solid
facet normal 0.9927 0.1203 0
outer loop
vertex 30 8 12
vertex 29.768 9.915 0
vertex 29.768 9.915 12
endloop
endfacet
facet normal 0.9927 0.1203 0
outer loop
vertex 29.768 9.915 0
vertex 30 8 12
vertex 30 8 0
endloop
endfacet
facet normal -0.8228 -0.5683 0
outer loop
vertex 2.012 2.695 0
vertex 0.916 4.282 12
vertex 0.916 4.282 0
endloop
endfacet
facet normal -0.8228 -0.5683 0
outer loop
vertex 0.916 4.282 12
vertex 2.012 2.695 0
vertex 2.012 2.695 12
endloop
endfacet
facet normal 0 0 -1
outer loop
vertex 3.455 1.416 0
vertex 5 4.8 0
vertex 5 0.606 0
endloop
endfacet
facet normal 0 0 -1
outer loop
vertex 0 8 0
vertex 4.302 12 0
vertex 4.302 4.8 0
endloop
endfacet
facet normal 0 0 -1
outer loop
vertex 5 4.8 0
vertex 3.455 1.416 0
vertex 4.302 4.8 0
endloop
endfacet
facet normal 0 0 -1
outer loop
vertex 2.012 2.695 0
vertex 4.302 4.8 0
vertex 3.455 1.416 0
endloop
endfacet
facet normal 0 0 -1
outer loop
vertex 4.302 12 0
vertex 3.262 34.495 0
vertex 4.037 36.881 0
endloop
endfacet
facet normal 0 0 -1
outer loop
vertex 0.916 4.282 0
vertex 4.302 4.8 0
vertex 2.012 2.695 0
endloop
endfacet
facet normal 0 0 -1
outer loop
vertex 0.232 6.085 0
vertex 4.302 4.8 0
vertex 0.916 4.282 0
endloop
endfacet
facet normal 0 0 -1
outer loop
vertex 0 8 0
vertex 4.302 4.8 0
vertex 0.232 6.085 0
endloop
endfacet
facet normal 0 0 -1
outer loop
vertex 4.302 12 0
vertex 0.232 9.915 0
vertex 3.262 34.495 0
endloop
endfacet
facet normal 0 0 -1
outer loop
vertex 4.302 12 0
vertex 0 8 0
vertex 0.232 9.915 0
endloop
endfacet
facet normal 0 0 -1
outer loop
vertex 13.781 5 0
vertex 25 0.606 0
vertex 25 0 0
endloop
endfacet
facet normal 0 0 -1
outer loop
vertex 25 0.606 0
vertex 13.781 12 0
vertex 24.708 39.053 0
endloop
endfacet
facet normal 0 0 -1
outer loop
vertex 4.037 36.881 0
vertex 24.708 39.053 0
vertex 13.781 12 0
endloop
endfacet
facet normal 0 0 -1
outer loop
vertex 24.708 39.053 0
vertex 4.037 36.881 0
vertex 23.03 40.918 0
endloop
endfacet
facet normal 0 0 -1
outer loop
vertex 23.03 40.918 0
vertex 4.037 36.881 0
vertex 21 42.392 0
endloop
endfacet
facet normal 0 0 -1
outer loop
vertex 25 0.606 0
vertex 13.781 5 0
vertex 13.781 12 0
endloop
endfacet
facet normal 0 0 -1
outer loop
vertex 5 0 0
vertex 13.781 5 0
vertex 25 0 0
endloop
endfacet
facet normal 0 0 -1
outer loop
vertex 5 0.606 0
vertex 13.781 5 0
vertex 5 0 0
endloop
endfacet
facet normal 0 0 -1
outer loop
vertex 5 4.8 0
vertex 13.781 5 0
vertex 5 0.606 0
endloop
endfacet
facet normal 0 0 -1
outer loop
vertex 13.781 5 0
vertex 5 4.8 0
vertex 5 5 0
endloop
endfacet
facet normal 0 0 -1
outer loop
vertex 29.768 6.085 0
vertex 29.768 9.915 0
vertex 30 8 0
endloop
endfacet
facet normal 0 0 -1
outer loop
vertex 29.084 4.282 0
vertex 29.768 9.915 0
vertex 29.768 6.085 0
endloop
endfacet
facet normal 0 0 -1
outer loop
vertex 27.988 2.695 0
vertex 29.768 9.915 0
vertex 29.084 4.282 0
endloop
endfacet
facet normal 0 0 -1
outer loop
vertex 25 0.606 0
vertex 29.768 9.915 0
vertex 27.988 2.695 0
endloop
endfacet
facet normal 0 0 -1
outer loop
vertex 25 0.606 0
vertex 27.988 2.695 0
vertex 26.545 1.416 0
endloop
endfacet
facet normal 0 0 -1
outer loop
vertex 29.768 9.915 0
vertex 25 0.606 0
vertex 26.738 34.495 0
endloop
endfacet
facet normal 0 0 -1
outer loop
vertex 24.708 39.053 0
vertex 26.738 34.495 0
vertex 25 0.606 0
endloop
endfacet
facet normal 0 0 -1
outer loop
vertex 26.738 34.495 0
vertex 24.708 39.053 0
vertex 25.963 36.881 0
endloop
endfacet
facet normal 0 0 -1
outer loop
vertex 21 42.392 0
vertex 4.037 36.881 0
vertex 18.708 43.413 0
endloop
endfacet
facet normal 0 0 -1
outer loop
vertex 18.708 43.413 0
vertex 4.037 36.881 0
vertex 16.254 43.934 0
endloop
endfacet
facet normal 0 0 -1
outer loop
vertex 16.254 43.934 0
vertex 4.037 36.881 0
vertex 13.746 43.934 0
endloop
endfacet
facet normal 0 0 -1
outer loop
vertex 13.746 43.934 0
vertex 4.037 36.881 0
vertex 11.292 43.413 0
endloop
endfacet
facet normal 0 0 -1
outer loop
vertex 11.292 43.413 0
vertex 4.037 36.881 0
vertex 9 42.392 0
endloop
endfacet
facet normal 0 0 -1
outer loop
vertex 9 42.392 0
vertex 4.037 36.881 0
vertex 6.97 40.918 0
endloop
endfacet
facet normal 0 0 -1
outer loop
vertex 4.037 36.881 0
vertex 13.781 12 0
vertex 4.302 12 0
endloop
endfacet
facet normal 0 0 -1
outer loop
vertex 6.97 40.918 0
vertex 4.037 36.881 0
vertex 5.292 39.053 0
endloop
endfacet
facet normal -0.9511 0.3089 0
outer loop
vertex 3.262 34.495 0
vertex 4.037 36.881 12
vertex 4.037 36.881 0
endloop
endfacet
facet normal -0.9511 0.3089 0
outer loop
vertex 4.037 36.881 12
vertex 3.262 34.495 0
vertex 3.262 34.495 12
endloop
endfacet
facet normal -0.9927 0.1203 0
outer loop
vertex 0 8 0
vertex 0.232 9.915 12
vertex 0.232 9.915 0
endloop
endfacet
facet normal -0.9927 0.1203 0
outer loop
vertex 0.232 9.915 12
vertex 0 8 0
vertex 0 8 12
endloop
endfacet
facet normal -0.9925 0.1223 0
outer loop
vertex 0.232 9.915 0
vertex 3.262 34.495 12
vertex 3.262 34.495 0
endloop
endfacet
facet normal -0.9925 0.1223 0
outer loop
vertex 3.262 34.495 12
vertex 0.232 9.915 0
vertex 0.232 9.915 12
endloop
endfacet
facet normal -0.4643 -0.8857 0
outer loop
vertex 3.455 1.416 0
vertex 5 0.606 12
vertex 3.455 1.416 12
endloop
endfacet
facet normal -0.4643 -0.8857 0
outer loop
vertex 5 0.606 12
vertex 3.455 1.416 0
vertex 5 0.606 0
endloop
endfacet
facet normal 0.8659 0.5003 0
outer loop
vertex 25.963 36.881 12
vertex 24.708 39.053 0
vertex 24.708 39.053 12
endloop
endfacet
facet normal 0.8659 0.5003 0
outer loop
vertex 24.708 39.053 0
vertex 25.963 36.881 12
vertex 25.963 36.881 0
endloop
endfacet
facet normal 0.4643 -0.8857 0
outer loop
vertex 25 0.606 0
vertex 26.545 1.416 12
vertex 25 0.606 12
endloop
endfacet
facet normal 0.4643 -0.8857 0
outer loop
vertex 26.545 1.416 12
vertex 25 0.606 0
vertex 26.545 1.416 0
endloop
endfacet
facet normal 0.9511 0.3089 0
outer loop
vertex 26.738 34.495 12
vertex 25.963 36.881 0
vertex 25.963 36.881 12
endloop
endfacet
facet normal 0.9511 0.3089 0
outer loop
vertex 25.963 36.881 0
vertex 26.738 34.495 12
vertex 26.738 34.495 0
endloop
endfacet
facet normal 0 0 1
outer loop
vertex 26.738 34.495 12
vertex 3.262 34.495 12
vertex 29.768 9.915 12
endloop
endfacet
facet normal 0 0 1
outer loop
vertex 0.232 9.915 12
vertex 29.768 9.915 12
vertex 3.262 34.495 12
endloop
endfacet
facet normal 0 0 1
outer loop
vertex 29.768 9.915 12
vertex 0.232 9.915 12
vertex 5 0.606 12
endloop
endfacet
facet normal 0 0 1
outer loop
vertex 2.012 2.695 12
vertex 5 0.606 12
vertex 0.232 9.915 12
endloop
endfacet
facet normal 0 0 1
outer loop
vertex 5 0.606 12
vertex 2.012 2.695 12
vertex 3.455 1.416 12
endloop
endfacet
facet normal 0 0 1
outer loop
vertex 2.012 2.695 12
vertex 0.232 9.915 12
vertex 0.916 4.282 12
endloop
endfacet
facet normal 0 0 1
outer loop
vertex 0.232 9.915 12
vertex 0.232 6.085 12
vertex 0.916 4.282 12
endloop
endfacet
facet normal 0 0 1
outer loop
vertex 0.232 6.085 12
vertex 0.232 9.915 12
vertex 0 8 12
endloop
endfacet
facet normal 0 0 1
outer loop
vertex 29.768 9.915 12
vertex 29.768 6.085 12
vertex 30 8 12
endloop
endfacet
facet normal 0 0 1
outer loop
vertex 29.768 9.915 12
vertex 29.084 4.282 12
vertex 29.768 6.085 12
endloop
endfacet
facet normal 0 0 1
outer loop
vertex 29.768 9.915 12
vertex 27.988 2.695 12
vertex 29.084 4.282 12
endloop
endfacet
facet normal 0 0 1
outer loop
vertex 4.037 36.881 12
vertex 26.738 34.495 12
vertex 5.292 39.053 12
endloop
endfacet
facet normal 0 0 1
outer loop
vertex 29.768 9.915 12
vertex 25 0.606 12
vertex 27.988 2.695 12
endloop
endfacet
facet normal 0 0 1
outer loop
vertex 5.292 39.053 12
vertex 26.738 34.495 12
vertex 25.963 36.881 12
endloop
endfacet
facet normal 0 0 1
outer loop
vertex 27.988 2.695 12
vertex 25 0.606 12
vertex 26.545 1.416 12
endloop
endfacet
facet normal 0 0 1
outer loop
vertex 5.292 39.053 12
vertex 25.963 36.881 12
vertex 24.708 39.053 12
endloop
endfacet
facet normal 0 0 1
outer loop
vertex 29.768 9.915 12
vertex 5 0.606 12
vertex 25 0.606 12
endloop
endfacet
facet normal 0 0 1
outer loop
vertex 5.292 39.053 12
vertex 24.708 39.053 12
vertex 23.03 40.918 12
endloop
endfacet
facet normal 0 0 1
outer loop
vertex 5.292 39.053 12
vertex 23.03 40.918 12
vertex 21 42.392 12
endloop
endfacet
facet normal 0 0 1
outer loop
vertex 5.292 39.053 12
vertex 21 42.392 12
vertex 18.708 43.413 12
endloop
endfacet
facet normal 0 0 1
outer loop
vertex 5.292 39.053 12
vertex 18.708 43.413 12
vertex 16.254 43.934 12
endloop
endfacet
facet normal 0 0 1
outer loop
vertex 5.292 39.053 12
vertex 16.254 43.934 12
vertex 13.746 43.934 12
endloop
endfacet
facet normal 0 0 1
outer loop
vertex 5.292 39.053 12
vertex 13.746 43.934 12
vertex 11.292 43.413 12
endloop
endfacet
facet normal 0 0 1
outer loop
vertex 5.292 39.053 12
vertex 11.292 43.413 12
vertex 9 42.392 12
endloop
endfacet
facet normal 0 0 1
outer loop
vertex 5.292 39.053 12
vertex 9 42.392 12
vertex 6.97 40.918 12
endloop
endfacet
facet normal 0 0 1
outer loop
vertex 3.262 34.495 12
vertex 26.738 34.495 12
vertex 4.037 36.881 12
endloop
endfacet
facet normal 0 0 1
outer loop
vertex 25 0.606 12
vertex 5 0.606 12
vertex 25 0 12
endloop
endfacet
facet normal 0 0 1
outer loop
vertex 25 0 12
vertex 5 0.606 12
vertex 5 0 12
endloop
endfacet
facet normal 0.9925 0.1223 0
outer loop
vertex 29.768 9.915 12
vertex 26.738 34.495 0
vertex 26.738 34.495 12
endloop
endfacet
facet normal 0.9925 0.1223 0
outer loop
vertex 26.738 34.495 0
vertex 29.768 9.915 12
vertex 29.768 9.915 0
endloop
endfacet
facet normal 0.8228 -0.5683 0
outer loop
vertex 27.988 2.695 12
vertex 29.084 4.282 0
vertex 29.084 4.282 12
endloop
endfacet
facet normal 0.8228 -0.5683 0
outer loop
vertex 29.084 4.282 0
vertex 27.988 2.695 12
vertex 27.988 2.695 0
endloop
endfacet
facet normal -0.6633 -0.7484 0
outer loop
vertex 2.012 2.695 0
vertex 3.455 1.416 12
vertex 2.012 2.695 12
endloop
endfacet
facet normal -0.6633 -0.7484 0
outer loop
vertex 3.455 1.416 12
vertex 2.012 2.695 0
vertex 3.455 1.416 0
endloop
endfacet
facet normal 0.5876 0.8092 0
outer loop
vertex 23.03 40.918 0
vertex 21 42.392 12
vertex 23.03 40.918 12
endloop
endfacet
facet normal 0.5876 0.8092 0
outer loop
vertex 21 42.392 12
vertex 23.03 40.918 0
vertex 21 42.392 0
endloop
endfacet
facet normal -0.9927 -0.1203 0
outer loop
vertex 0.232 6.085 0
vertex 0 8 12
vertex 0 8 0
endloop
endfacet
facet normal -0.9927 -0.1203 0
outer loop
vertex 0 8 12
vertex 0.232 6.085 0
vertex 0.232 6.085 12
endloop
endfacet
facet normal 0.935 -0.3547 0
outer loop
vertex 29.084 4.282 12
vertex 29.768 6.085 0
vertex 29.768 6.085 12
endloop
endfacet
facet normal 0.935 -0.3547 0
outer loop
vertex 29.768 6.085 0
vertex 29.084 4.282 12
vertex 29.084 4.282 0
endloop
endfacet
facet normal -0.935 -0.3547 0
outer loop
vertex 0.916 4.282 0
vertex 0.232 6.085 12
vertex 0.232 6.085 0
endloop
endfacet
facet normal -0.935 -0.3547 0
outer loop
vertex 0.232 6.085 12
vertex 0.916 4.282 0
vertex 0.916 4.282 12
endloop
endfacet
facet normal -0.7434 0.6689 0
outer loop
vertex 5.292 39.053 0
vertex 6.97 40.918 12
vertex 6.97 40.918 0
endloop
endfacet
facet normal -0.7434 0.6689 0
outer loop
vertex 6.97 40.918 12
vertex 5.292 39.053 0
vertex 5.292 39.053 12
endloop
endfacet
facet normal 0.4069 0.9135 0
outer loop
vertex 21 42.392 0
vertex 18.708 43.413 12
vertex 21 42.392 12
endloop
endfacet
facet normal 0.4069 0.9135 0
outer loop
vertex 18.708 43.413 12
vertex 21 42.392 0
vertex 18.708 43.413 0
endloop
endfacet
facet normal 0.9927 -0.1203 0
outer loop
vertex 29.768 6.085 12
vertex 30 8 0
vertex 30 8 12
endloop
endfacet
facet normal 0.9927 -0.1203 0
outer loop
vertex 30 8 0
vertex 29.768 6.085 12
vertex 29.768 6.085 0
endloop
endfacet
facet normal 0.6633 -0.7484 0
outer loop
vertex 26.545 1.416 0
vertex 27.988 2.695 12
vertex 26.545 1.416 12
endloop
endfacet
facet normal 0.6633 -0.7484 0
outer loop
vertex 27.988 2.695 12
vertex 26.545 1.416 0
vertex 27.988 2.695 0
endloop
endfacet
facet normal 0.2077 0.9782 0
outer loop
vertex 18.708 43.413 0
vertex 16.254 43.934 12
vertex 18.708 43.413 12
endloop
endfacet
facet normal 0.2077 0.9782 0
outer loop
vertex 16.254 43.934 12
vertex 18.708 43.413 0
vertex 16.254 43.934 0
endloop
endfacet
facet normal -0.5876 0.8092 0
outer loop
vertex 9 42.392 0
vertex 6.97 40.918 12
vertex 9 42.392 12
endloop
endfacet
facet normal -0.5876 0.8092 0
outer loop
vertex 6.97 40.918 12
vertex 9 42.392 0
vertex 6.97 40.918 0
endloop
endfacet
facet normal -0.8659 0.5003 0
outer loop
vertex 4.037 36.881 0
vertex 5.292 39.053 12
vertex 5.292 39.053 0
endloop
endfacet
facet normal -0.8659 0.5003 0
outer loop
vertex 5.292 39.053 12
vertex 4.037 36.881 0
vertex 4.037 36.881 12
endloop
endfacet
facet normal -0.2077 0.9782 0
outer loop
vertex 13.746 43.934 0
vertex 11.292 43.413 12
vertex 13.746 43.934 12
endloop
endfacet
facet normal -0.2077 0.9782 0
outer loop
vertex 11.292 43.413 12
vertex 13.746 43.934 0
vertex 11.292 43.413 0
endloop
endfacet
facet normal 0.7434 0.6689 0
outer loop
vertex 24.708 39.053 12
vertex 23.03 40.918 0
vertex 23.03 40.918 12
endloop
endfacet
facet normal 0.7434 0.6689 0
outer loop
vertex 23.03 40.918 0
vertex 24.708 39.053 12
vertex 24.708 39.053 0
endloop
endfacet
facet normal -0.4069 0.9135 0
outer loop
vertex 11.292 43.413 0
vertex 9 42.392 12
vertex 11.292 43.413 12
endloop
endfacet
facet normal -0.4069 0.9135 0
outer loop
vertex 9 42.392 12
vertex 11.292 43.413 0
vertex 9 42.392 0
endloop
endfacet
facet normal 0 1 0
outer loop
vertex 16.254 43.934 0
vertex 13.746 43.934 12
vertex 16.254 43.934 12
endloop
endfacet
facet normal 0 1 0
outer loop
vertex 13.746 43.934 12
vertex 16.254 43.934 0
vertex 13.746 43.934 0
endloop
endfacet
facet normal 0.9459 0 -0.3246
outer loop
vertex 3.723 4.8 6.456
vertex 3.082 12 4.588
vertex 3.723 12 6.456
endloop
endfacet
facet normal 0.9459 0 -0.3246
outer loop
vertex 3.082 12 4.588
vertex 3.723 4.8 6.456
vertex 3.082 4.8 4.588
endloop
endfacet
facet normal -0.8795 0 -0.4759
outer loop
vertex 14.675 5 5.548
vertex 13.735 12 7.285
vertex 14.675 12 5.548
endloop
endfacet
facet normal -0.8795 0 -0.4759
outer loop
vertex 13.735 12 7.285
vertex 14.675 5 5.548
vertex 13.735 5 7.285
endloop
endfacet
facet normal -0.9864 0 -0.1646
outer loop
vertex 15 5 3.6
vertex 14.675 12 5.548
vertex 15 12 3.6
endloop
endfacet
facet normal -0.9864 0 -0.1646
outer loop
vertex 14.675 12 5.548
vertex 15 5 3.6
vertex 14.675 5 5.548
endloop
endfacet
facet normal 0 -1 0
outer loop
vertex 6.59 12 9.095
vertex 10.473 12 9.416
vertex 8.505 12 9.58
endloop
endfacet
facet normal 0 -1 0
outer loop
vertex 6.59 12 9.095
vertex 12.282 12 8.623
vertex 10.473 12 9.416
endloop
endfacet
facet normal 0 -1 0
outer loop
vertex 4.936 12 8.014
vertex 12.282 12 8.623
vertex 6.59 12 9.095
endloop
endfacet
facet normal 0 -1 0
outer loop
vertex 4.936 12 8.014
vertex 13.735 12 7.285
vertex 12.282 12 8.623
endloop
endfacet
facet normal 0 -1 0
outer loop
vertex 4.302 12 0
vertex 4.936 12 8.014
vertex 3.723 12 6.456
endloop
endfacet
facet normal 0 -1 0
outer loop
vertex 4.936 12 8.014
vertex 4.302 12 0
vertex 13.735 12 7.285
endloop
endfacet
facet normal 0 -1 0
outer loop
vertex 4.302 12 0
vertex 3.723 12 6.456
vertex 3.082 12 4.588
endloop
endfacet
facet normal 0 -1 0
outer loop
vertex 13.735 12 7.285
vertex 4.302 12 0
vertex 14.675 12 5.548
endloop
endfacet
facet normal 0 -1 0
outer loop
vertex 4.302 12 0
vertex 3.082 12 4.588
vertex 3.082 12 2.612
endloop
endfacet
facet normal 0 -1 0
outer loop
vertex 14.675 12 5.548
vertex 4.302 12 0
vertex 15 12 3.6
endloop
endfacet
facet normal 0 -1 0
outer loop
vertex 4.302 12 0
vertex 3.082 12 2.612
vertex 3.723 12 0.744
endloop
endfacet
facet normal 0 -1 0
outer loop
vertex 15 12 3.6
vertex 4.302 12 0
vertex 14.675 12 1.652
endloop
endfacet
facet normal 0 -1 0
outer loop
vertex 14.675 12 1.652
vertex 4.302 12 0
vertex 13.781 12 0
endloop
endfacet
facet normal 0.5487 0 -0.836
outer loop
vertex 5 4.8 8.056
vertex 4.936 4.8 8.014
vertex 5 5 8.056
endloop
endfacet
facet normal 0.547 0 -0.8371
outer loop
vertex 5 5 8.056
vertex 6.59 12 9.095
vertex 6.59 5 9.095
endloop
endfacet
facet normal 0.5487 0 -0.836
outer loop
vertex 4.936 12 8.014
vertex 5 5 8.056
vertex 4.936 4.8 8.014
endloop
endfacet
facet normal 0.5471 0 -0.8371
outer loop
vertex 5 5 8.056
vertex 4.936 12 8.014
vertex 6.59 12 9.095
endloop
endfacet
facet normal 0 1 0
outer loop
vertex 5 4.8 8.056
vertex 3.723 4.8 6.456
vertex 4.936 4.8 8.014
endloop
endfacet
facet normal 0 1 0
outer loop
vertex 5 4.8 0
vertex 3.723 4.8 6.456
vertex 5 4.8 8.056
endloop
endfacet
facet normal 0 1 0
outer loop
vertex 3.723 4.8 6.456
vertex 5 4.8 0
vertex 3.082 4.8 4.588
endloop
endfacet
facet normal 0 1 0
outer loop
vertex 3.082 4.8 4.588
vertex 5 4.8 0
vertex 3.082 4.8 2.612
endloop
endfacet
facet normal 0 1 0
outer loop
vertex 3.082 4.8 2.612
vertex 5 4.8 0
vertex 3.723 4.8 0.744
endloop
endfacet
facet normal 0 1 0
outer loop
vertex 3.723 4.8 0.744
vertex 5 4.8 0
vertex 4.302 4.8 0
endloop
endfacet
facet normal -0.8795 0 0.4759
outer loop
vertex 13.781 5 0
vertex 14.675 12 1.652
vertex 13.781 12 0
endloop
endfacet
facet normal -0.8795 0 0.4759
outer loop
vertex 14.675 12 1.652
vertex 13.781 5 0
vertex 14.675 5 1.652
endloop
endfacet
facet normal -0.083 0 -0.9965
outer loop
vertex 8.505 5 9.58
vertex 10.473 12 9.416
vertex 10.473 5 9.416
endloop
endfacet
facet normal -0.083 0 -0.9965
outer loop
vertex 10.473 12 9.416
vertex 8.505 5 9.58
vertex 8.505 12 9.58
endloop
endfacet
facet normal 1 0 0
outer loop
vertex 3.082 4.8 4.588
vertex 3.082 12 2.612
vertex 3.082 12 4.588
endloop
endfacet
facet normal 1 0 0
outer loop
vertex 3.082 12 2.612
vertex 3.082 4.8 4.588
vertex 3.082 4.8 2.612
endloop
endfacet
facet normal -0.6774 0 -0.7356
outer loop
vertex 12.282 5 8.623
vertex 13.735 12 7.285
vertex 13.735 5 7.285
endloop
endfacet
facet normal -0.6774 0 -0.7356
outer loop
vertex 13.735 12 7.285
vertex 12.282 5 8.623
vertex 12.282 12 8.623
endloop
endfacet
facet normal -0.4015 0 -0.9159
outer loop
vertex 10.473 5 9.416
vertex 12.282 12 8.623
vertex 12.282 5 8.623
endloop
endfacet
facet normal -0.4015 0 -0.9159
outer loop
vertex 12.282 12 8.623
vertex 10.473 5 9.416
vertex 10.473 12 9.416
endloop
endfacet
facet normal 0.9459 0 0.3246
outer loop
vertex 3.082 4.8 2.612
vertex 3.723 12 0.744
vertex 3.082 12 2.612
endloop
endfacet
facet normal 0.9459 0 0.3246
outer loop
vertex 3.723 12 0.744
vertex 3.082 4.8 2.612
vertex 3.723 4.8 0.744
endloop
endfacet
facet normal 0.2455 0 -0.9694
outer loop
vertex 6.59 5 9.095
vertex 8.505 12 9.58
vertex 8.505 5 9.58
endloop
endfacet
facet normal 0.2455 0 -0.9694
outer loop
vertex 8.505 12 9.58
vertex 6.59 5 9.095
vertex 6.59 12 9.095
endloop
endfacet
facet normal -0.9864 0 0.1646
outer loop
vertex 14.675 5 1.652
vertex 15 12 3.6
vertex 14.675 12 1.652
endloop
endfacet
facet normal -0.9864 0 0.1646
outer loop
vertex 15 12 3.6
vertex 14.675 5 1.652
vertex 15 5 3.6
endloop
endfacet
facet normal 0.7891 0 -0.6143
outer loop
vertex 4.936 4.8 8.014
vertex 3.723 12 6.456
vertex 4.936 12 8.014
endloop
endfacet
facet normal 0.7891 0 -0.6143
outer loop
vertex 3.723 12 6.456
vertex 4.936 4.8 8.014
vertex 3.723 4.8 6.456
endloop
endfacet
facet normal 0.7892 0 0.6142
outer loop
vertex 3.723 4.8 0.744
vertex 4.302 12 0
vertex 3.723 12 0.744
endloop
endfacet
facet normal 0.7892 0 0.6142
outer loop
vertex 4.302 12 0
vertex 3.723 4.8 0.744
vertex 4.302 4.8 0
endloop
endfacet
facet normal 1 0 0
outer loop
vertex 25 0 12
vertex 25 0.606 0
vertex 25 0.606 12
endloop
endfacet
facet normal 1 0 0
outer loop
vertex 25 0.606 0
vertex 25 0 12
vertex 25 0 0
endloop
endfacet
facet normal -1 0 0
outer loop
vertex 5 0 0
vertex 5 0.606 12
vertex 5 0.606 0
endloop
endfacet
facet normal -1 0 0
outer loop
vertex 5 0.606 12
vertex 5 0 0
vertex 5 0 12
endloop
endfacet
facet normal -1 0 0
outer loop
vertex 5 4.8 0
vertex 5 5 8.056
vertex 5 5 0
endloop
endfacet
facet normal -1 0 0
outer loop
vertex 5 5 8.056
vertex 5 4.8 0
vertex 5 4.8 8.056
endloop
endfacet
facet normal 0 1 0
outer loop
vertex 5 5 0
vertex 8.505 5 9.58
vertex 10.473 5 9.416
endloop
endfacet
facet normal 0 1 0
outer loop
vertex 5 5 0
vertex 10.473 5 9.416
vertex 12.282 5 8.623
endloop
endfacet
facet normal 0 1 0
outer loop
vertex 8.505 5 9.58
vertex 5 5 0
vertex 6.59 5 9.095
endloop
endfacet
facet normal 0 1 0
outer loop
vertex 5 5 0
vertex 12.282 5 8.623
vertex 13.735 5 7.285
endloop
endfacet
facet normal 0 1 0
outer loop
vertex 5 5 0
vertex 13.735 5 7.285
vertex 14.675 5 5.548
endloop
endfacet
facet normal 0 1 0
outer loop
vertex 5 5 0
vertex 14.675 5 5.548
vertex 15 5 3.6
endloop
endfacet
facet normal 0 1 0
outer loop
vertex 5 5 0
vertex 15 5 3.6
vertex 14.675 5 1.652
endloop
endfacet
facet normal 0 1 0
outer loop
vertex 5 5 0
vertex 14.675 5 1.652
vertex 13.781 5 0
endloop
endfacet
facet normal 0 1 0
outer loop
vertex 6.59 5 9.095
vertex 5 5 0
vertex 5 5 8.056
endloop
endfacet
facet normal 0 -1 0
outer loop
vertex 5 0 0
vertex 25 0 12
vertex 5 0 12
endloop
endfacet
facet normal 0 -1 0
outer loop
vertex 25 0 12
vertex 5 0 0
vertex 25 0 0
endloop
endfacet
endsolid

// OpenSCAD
// PERCY UNIT - Cat Ear Helmet Visors (x2)
// OpenSCAD file - export to STL for 3D printing

// Parameters
ear_height = 40;
ear_width = 30;
ear_depth = 12;
inner_curve = 8;

// Cat ear shape
module cat_ear(width, height, depth, curve) {
    hull() {
        // Base corner (rounded)
        translate([curve, curve, 0])
            cylinder(r=curve, h=depth);
        translate([width - curve, curve, 0])
            cylinder(r=curve, h=depth);
        // Peak of ear (pointy)
        translate([width/2, height - curve, 0])
            cylinder(r=curve*1.5, h=depth);
    }
}

// Single ear
difference() {
    cat_ear(ear_width, ear_height, ear_depth, inner_curve);
    
    // Hollow inside (to save material and be lighter)
    translate([ear_width*0.3, ear_depth, ear_depth*0.3])
        rotate([90, 0, 0])
            cylinder(d=ear_width*0.4, h=ear_depth*0.6);
}

// LED strip groove
translate([ear_width/2 - 3, ear_height*0.6, ear_depth/2])
    cube([6, ear_height*0.3, 3]);

// Mounting flange (for helmet attachment)
flange_width = 20;
flange_height = 5;
translate([ear_width/2 - flange_width/2, 0, 0])
    cube([flange_width, flange_height, ear_depth]);
